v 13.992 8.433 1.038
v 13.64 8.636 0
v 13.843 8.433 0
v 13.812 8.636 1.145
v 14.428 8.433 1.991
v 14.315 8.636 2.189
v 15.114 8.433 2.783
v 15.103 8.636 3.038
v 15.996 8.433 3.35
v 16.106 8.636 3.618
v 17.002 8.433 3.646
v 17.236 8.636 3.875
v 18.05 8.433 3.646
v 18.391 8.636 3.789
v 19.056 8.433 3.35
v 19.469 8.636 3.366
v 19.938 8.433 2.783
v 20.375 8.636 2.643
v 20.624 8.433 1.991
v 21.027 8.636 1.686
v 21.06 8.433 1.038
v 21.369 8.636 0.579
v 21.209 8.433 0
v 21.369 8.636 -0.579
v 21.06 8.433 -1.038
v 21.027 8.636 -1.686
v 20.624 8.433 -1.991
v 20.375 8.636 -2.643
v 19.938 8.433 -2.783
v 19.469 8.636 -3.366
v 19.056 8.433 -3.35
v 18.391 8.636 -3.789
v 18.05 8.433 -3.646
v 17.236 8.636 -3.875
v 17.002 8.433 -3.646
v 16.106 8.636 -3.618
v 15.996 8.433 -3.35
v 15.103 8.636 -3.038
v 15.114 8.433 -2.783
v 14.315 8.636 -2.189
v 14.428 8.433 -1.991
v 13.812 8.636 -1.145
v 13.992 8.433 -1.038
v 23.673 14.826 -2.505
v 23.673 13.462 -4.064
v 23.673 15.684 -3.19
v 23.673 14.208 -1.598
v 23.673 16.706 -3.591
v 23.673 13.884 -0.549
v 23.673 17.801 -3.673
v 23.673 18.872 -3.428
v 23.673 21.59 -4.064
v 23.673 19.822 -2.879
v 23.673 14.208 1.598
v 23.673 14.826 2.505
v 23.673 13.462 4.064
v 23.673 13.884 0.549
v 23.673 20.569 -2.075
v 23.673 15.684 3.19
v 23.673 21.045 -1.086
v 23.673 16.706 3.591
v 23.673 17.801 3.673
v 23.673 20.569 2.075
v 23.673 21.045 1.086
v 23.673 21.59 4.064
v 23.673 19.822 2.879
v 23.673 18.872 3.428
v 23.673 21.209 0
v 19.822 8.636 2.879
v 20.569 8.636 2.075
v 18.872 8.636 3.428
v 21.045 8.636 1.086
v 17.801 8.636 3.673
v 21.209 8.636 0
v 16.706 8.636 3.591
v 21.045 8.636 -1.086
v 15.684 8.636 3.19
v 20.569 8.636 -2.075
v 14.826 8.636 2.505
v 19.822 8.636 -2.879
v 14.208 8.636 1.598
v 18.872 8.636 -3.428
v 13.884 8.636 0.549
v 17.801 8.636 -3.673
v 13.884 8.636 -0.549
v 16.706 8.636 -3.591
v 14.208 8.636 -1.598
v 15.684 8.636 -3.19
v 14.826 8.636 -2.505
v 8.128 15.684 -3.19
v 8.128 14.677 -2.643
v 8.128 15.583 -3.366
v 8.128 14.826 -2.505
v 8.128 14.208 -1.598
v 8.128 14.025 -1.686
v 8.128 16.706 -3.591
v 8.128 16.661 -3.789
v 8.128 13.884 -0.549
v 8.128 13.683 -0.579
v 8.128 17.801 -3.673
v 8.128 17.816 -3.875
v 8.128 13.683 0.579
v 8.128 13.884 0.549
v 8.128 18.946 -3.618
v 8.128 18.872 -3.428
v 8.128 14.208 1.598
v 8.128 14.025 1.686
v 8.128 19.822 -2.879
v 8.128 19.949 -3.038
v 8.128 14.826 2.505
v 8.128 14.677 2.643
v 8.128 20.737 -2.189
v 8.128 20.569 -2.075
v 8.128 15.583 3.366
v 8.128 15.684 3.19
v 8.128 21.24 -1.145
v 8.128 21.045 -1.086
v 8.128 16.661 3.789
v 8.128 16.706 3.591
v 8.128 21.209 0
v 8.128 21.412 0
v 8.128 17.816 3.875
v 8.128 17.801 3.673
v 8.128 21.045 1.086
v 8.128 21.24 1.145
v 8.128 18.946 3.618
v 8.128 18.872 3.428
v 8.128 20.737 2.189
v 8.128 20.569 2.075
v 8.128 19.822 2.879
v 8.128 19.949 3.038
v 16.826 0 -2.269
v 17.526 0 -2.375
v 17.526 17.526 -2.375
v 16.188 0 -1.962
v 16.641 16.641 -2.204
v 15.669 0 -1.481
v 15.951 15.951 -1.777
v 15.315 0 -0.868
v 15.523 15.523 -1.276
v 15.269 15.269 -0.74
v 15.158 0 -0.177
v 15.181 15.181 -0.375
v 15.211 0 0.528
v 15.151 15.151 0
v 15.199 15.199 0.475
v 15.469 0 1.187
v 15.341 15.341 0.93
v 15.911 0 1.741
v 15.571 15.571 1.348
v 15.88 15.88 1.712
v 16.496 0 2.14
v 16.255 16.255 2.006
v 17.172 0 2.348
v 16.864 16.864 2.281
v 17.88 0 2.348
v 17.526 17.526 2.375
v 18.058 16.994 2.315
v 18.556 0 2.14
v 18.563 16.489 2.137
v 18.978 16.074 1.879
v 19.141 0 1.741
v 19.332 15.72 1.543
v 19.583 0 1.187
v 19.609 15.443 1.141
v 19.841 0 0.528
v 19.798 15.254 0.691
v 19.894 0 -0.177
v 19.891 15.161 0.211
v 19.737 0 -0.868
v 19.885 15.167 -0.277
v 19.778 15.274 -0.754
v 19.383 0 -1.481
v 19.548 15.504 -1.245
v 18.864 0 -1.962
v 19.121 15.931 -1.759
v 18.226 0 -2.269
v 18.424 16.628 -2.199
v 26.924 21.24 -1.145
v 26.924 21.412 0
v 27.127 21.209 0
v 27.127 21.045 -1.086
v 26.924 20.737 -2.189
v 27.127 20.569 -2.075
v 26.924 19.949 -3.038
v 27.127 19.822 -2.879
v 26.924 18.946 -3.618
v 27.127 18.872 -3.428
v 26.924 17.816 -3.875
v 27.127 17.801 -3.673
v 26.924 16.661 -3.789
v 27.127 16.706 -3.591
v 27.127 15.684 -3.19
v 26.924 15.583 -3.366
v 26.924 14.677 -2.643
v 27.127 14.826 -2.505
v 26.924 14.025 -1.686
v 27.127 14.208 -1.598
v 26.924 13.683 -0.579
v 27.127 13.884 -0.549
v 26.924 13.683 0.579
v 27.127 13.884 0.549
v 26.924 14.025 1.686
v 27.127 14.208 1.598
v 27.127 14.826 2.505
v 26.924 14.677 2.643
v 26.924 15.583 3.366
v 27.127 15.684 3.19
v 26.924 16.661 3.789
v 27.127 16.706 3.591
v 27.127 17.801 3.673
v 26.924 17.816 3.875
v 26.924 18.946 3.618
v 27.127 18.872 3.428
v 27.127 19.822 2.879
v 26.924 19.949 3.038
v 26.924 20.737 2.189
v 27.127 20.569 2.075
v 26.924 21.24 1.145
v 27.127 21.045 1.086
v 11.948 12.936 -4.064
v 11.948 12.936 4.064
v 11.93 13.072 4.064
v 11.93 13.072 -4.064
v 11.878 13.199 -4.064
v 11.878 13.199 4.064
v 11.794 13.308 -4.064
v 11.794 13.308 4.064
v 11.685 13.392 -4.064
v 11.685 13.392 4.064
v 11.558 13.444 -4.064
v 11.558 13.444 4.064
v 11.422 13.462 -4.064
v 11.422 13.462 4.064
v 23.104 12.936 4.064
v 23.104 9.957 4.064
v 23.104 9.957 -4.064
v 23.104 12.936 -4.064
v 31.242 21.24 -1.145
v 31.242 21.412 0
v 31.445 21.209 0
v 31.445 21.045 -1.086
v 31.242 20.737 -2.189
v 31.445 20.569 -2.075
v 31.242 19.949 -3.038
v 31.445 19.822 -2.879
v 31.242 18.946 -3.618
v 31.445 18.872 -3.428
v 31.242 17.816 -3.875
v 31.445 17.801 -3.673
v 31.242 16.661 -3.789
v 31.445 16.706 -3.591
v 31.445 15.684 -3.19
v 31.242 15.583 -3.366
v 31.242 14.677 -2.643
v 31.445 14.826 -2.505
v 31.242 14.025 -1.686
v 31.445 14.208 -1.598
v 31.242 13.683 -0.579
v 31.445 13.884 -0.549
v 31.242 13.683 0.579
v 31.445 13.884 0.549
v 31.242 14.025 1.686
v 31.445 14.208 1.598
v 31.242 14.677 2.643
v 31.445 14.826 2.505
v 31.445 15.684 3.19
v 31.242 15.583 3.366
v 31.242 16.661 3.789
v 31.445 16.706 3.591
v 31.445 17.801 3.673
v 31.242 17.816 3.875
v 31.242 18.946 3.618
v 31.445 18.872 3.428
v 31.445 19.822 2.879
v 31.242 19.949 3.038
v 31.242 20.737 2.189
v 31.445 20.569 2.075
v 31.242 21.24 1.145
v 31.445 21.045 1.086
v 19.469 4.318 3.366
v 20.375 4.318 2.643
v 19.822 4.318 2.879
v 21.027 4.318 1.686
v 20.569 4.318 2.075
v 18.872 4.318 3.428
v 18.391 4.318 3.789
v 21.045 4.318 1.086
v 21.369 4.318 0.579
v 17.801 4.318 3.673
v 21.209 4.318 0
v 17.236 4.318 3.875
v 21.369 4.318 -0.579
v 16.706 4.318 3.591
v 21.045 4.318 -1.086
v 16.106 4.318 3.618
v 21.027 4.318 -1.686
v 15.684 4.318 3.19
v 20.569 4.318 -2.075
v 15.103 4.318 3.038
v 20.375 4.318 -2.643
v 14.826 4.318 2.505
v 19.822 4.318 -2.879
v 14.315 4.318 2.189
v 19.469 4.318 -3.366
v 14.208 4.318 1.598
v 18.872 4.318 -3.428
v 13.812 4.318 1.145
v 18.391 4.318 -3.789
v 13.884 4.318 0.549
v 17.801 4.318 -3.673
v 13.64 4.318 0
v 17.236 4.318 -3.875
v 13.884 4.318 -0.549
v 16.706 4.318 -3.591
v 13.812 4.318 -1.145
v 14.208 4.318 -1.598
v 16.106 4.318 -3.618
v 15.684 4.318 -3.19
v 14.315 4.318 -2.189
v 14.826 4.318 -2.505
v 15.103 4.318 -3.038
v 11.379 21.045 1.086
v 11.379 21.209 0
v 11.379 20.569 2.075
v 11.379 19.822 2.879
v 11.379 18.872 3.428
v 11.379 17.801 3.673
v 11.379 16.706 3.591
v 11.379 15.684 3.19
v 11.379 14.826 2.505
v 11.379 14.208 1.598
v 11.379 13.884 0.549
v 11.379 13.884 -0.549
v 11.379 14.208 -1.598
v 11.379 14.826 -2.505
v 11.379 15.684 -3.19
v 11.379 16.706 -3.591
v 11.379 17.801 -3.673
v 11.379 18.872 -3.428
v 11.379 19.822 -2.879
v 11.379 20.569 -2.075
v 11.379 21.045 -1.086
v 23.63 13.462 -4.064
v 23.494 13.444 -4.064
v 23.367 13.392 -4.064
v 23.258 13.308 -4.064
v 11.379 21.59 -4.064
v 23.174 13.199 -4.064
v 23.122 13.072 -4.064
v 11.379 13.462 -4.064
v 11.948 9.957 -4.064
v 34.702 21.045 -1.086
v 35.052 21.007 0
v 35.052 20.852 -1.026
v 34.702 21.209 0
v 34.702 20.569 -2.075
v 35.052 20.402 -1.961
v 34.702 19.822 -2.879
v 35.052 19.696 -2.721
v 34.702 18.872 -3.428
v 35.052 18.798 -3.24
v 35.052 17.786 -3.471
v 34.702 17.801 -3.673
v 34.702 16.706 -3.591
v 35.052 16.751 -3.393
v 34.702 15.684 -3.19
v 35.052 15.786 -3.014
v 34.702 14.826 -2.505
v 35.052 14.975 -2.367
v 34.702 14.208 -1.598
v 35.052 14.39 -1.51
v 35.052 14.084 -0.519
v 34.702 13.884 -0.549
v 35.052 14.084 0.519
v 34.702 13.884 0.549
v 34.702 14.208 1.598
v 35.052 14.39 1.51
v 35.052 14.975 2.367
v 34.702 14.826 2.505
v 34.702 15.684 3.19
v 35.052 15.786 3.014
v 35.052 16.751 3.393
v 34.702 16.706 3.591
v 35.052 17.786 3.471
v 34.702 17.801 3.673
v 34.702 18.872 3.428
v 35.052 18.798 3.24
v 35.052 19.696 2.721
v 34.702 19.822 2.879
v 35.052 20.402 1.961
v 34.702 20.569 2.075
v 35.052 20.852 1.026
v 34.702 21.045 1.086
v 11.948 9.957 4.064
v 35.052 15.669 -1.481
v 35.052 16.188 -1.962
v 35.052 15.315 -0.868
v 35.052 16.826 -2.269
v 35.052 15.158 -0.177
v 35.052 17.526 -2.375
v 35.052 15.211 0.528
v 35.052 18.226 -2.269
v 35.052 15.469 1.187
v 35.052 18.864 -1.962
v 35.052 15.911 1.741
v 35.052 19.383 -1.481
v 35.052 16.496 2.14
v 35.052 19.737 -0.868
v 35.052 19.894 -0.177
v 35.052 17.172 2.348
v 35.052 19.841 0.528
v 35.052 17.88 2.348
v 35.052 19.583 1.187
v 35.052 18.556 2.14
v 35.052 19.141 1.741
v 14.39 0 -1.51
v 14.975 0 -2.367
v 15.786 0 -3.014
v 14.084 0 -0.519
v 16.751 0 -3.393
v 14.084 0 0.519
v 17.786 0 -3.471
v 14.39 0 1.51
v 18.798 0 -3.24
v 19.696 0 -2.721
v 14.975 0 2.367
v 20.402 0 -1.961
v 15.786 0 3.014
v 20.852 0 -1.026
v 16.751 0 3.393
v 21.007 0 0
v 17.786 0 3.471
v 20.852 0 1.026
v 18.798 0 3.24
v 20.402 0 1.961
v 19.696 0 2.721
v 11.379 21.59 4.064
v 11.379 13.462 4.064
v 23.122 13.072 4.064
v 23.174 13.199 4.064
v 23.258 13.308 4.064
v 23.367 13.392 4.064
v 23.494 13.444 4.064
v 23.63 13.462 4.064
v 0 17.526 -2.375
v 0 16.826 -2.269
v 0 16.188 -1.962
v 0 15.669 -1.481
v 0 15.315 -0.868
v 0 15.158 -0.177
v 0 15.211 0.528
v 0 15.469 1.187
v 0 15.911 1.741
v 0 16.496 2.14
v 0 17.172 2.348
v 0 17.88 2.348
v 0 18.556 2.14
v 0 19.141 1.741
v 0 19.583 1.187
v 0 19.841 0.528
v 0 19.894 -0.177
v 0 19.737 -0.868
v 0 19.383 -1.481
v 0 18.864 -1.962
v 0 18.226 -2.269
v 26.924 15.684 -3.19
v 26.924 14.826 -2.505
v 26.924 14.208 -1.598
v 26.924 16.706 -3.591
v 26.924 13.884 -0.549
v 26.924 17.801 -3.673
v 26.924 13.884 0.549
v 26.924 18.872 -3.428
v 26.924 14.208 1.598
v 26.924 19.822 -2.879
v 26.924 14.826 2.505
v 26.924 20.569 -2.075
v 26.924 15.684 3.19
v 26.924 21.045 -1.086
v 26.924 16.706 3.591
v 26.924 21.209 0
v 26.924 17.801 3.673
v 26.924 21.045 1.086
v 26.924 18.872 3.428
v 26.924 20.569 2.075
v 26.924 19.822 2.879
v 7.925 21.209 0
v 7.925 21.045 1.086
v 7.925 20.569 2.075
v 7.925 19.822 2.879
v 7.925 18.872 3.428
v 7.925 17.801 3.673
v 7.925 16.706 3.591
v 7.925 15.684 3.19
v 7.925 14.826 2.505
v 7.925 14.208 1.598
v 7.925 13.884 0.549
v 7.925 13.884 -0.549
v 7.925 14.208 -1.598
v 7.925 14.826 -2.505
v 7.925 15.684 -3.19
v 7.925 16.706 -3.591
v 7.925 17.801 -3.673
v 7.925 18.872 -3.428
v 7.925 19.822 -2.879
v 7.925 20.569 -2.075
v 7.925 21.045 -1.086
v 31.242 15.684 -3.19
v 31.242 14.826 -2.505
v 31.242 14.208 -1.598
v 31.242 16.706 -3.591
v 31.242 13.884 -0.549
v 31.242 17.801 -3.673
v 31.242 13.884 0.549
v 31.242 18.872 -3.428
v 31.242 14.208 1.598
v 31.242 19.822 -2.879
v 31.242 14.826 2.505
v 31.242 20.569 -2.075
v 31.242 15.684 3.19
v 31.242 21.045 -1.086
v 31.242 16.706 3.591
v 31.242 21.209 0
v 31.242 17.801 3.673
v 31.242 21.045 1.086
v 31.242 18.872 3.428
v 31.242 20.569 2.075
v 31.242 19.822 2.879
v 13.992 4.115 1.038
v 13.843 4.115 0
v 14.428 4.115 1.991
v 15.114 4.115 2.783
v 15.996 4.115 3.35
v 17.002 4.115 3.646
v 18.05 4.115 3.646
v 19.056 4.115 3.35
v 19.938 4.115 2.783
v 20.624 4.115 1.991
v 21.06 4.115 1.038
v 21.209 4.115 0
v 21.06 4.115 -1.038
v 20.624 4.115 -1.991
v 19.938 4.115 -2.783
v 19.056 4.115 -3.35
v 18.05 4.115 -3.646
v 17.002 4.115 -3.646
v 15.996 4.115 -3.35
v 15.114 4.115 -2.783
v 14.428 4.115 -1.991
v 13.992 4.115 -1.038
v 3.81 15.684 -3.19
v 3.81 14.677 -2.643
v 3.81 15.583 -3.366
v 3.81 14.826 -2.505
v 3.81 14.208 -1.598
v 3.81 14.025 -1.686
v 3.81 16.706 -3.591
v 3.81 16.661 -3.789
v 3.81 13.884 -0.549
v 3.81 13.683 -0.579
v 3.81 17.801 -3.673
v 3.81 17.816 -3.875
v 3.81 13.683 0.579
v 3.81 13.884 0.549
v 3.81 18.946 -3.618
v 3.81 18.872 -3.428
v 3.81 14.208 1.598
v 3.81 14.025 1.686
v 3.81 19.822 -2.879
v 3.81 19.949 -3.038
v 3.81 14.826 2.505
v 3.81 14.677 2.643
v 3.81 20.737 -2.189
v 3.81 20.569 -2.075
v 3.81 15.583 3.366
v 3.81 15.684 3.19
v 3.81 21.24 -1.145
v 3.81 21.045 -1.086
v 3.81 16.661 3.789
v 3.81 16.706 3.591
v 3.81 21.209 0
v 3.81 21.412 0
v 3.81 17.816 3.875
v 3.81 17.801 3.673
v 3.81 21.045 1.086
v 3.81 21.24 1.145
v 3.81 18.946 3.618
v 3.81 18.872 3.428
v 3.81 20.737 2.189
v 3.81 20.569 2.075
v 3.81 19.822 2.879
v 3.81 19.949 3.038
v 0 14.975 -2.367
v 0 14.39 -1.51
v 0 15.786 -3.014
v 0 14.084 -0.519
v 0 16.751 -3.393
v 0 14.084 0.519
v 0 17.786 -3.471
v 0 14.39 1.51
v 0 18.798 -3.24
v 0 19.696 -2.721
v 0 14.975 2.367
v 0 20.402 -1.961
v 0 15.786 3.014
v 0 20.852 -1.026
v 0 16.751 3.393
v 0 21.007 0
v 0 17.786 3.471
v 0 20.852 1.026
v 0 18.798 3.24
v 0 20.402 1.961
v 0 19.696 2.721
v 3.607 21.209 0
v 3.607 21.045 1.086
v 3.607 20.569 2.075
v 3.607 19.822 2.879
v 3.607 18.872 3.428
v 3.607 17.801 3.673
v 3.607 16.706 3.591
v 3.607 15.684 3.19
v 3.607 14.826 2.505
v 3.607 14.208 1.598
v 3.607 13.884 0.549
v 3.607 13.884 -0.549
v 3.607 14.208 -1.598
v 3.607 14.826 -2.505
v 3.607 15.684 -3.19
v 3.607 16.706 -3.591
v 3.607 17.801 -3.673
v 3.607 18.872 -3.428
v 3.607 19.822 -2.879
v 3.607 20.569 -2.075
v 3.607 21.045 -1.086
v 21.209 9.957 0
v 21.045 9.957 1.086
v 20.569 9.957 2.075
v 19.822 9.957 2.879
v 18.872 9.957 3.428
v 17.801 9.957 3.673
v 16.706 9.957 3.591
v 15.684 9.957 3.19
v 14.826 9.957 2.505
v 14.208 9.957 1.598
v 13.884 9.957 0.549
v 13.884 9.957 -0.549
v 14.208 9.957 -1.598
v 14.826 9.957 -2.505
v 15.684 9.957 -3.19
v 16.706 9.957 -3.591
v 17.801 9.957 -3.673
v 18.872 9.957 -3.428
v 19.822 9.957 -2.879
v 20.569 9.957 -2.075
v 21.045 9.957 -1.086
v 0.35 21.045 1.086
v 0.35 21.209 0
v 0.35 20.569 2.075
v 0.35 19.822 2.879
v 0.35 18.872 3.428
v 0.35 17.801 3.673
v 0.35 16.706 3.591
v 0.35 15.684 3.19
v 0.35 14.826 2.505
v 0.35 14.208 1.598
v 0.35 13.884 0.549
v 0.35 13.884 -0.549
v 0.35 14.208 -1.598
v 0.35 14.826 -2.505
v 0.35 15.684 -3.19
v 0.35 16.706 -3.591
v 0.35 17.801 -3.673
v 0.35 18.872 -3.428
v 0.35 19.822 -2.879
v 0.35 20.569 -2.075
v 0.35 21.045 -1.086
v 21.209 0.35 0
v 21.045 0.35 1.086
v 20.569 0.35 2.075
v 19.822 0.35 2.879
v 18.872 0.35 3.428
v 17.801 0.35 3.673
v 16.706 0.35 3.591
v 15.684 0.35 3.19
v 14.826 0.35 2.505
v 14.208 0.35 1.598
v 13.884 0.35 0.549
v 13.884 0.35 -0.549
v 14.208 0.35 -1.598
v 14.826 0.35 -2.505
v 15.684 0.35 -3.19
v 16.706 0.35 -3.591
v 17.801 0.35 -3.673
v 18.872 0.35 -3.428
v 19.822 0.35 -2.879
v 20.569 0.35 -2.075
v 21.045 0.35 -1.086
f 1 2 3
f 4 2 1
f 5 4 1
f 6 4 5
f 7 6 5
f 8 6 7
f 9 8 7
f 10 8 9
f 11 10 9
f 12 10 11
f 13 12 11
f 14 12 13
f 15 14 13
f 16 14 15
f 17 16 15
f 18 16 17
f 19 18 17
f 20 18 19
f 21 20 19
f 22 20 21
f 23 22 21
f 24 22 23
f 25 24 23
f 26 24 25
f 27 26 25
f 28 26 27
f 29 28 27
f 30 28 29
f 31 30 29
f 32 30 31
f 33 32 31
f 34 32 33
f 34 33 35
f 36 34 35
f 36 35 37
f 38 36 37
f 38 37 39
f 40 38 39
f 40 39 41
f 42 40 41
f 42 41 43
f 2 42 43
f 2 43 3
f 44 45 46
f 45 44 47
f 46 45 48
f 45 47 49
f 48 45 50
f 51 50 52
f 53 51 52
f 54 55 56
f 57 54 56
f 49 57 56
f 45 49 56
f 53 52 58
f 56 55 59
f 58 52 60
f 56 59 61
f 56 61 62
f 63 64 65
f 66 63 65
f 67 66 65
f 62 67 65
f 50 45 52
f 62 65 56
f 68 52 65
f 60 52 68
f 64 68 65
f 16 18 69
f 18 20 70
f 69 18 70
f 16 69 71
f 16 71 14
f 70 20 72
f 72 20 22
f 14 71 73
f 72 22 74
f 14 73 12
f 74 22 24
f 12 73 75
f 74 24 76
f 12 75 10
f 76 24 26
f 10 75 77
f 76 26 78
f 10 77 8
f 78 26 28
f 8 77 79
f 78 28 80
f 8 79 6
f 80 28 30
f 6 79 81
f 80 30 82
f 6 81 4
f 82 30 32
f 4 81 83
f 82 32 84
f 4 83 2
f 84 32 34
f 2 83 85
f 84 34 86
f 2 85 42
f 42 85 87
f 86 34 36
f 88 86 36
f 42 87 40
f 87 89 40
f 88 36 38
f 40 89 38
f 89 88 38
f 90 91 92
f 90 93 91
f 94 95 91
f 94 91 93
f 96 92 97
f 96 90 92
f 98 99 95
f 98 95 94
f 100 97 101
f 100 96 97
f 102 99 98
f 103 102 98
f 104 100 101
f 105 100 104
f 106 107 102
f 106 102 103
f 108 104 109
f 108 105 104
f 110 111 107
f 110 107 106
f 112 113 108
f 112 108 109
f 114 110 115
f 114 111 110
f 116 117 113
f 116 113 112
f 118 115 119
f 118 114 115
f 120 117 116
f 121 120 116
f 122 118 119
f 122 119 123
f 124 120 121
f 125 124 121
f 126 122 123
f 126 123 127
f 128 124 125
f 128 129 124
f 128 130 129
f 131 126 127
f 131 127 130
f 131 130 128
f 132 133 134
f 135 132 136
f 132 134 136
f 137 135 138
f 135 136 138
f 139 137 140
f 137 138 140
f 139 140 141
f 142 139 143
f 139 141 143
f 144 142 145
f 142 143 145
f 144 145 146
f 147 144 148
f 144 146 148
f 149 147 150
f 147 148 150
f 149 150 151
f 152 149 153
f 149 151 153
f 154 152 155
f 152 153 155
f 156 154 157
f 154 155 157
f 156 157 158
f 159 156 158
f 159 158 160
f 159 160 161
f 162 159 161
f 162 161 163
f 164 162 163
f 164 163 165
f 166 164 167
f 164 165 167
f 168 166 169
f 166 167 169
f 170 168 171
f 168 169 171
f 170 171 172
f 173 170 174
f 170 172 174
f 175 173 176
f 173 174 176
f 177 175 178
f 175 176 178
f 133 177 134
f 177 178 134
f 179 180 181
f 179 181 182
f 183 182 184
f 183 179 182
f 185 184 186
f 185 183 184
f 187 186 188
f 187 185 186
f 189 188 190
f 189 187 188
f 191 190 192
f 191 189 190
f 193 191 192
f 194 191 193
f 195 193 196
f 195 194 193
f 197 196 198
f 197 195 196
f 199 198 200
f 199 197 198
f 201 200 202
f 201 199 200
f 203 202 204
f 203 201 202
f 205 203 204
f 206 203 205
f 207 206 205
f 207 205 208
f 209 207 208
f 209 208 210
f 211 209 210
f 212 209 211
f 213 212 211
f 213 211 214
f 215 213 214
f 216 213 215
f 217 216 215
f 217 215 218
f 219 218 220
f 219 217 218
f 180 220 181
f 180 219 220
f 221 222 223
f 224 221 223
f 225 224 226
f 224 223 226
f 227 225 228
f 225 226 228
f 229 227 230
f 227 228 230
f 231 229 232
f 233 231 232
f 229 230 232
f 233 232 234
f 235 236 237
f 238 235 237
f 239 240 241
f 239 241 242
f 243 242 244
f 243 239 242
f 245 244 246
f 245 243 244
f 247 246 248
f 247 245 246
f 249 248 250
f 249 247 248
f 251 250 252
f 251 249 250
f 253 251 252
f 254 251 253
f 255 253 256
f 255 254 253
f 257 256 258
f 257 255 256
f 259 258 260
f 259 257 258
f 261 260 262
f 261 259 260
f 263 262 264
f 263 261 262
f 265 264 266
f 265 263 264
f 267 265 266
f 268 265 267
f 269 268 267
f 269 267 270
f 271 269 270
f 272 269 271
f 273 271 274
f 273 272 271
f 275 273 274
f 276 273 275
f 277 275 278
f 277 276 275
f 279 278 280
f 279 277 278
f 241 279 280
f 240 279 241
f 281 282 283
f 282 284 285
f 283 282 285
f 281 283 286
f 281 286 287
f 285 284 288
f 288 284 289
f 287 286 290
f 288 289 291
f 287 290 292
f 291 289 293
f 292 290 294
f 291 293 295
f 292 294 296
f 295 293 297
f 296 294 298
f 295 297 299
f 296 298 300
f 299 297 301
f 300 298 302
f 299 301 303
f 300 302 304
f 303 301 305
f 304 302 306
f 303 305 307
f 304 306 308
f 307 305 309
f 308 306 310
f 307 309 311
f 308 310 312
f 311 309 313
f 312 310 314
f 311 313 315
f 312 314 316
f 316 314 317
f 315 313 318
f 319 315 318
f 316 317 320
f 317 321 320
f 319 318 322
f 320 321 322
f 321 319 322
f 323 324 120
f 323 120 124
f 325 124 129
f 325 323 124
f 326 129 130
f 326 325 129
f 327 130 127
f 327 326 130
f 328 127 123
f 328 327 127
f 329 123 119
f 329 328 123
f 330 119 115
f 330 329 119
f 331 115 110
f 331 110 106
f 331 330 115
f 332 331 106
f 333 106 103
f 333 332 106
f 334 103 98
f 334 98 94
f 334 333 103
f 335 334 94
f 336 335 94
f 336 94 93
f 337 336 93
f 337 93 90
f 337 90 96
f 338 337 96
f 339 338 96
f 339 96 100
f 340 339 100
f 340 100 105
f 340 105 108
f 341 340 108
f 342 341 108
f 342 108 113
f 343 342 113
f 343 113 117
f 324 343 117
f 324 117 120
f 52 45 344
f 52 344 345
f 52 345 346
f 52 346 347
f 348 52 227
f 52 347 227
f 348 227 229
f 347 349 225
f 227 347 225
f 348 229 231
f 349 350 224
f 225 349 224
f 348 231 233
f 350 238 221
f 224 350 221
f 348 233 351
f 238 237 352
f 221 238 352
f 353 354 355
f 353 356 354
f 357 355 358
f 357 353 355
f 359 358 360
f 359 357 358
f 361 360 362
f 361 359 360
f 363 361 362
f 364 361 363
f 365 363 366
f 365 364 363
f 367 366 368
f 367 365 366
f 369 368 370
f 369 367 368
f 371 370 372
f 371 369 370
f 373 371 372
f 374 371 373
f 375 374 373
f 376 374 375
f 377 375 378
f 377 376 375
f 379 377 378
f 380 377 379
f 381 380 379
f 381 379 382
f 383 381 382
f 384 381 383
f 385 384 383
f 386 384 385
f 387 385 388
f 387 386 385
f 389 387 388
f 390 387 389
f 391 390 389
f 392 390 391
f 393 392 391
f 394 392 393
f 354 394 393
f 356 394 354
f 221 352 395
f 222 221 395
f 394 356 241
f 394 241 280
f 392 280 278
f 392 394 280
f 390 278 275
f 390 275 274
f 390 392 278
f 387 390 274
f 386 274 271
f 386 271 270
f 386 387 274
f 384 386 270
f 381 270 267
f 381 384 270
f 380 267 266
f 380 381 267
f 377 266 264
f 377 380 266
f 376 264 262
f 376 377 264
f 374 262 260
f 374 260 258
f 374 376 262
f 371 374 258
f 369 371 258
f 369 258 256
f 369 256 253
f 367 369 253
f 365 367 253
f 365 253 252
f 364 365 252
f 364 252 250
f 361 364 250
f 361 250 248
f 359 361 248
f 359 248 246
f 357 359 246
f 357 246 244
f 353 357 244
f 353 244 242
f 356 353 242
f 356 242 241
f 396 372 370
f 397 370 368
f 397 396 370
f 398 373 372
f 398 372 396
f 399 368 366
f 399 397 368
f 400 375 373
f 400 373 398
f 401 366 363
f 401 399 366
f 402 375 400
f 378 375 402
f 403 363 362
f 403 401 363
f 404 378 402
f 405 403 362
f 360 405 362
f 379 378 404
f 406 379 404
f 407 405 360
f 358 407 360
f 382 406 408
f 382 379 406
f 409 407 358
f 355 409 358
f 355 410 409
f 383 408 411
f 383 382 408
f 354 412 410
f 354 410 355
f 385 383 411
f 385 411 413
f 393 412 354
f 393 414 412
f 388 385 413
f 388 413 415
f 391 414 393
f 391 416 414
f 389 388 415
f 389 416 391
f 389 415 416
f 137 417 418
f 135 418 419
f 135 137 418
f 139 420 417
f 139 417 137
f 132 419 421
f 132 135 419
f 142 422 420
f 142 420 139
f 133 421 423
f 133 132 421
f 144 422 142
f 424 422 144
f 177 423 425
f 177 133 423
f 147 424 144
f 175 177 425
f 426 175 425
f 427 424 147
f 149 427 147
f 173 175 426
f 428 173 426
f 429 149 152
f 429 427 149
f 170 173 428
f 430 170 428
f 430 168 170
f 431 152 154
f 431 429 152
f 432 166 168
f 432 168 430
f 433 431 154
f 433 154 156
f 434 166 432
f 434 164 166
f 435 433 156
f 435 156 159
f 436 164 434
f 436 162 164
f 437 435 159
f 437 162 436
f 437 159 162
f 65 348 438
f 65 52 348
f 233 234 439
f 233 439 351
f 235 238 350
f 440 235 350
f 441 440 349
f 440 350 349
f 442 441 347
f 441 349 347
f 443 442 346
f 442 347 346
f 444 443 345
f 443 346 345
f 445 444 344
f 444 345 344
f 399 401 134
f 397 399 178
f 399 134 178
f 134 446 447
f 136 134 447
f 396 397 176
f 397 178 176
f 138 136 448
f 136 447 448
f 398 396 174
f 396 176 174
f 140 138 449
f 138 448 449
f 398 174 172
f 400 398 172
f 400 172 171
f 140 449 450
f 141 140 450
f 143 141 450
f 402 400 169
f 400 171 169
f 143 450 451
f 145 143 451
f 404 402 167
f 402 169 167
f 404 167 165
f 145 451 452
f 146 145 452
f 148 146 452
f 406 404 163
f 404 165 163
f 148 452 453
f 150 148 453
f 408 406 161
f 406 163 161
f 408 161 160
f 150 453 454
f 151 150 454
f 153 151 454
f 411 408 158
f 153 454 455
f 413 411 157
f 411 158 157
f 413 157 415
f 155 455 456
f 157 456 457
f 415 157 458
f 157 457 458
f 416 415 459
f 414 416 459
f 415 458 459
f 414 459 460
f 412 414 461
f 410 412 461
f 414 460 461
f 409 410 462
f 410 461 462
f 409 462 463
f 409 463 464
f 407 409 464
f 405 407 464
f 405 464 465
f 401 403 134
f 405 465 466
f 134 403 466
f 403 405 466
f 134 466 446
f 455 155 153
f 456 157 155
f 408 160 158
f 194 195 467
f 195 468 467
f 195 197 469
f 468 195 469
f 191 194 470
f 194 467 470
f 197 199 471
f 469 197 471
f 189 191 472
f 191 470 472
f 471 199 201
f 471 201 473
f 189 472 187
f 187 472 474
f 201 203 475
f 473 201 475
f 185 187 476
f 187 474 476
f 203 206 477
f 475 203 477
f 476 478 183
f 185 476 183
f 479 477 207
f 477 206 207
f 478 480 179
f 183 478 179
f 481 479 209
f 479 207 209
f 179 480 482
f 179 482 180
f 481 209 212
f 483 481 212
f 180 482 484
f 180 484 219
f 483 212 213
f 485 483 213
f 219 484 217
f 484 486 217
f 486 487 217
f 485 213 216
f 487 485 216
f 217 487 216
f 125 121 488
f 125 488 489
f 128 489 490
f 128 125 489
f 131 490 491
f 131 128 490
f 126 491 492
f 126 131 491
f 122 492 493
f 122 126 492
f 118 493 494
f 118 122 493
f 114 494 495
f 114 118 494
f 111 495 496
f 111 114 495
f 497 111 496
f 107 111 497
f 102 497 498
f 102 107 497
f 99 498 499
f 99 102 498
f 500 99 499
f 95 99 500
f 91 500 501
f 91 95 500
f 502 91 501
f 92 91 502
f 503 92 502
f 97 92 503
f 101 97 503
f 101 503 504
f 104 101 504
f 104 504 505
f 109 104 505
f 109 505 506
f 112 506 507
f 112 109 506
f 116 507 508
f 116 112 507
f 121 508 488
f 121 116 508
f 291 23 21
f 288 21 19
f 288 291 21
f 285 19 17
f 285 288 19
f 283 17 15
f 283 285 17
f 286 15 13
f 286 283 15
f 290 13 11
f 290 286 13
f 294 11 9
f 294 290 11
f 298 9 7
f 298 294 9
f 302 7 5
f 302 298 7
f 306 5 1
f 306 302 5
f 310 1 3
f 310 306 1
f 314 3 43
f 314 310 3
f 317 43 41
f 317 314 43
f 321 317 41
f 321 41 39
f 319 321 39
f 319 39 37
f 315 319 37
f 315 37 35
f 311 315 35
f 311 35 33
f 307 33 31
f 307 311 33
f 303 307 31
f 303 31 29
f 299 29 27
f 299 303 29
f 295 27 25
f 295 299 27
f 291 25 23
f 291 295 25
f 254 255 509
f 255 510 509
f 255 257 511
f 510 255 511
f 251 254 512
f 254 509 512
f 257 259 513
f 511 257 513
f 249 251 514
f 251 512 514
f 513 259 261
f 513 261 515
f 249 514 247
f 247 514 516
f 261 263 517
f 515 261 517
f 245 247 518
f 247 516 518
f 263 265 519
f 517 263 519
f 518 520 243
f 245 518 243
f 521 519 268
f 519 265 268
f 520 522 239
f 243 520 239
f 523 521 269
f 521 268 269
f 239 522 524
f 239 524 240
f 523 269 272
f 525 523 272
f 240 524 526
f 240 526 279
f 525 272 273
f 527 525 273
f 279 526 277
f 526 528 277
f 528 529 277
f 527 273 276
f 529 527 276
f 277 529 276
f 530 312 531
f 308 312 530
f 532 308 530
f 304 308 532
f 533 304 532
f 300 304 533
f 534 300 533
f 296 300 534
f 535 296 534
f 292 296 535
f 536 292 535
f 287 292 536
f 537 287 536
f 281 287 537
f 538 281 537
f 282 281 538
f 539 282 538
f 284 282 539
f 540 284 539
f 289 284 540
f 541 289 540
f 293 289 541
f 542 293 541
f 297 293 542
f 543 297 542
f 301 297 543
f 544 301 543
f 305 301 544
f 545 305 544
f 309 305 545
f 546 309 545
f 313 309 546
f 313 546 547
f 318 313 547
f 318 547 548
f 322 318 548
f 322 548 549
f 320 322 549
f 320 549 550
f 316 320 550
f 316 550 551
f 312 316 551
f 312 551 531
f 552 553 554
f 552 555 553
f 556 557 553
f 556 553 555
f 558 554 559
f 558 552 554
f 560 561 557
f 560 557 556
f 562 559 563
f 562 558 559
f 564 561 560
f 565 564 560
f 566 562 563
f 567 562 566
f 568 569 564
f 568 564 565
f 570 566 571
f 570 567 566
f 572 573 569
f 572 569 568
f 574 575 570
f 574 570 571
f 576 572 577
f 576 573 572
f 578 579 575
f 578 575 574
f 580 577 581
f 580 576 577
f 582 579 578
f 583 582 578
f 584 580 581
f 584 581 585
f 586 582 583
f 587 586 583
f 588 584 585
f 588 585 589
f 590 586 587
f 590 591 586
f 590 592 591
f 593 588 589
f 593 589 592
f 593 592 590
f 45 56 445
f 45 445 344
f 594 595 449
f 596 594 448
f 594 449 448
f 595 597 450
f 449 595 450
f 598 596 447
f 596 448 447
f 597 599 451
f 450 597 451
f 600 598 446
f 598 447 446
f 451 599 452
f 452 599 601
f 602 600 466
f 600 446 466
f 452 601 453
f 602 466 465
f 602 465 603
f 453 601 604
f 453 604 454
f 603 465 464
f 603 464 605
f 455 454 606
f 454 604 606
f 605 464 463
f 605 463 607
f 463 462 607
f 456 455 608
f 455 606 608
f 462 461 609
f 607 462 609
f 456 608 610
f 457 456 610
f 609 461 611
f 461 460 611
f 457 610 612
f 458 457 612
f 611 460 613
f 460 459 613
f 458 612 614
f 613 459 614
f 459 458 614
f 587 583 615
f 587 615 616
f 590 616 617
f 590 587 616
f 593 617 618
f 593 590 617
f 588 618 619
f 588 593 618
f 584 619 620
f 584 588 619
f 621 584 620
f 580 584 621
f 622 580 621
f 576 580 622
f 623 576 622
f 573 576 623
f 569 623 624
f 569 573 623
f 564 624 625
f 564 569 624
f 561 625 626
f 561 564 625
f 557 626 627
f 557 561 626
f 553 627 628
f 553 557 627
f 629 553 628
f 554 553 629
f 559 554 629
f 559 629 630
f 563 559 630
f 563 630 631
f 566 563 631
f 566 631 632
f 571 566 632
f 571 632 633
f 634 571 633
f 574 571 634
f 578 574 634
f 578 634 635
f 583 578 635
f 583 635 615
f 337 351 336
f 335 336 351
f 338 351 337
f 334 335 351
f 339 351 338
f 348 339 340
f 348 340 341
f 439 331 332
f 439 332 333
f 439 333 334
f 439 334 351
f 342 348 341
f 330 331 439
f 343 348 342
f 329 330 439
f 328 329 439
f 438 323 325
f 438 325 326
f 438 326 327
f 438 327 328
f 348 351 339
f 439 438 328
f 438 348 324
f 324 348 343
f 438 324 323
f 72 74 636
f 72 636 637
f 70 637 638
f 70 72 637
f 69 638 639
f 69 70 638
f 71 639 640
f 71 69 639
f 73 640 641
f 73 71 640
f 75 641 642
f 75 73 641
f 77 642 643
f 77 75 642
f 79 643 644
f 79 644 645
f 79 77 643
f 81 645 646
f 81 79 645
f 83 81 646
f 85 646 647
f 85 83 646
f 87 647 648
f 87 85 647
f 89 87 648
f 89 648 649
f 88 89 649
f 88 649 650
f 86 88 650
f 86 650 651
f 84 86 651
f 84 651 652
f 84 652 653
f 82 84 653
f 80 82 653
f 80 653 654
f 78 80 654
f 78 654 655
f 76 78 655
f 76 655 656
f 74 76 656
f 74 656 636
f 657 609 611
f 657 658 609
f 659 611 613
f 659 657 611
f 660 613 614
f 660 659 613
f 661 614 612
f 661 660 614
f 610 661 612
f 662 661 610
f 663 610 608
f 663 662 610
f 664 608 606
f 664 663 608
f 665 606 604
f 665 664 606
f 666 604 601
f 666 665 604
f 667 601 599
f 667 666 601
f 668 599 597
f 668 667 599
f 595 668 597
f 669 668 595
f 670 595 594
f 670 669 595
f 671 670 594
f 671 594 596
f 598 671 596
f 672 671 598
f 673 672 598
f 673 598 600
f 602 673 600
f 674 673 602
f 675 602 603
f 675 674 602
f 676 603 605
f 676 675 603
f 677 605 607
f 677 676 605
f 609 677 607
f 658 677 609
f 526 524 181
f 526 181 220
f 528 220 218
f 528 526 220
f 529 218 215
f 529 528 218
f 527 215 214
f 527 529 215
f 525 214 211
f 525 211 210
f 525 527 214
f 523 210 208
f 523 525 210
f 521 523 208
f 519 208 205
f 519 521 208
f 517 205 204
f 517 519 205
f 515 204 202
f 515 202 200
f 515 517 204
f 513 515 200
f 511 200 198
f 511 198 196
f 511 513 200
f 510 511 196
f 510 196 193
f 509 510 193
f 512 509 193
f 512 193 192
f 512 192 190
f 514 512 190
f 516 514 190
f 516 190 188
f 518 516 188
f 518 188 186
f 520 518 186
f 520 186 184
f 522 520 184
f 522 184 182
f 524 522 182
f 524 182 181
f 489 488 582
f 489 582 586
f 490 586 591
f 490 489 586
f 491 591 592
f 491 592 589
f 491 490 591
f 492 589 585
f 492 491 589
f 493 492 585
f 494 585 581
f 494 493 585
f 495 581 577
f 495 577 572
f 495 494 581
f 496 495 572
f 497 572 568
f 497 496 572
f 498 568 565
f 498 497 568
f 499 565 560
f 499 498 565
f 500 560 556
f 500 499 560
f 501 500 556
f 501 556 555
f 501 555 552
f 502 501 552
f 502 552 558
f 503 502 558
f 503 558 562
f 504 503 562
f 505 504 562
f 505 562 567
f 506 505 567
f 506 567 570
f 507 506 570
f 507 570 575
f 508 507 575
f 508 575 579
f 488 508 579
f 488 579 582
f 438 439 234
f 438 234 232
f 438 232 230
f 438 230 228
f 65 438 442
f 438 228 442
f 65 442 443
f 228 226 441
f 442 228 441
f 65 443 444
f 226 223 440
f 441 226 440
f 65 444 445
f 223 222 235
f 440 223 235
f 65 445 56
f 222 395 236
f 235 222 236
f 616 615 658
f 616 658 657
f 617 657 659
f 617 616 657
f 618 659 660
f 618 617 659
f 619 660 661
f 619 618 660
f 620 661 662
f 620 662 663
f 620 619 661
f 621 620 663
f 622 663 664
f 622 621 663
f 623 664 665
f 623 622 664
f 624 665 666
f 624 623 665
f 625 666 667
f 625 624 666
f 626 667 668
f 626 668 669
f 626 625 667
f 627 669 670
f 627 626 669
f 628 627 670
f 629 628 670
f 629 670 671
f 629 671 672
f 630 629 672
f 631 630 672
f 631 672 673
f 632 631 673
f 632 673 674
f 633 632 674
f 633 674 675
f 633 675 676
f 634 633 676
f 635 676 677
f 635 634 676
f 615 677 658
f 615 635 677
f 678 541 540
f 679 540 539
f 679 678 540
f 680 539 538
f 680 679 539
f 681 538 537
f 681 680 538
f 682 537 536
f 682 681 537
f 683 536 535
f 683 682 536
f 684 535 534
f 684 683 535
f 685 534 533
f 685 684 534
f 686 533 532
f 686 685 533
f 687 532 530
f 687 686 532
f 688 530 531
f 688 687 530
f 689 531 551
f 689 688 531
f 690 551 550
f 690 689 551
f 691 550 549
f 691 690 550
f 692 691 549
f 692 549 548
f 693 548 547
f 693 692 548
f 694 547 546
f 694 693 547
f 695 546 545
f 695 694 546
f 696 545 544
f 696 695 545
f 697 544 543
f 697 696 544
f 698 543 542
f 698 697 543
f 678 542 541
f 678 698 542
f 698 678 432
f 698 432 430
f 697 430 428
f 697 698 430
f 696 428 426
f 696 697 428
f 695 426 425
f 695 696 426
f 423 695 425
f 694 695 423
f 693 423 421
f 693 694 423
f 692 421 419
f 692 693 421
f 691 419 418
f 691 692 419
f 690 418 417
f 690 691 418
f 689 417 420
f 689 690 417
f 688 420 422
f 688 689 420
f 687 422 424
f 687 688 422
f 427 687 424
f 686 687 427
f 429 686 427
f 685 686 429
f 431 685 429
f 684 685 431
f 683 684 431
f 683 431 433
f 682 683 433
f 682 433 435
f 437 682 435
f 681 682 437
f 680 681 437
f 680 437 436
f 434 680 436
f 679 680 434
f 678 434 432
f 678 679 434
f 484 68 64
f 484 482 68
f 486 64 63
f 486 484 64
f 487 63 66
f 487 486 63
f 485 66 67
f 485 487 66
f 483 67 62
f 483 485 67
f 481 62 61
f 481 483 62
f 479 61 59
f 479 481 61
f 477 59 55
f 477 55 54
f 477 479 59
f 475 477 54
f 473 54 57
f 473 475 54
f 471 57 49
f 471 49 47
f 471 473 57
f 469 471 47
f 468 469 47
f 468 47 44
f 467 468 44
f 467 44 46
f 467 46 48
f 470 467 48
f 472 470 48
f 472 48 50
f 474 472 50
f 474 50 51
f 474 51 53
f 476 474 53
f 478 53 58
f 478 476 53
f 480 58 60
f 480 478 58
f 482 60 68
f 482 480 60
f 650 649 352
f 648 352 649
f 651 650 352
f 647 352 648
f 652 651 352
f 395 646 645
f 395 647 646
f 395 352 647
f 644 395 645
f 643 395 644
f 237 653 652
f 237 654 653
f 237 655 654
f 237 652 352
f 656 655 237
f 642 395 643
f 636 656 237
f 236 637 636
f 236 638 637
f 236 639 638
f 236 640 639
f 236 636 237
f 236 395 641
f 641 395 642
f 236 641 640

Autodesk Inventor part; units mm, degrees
ref_plane "YZ Plane" through (0, 0, 0) normal (1, 0, 0) x (0, 1, 0)
ref_plane "XZ Plane" through (0, 0, 0) normal (0, 1, 0) x (-1, 0, 0)
ref_plane "XY Plane" through (0, 0, 0) normal (0, 0, 1) x (1, 0, 0)
sketch "Sketch7" plane through (0, 0, 0) normal (0, 0, 1) x (1, 0, 0)
  line L0 (0, 21.209) -> (11.3919, 21.209)
  line L1 (11.3919, 21.209) -> (11.3919, 21.209)
  line L2 (11.3919, 21.209) -> (23.6601, 21.209)
  line L3 (23.6601, 21.209) -> (23.6601, 21.209)
  line L4 (23.6601, 21.209) -> (35.052, 21.209)
  line L5 (35.052, 21.209) -> (35.052, 17.526)
  line L6 (0, 17.526) -> (0, 21.209)
  line L7 (0, 17.526) -> (35.052, 17.526)
  line L8 (-6.2642, 17.526) -> (48.9647, 17.526)
  point P0 (0, 0)
  dimension "d57" = 17.526
  dimension "d58" = 7.366
  dimension "d59" = 35.052
  dimension "d60" = 12.2682
  dimension "d128" = 3.683
revolve "Revolution3" add sketch "Sketch7" angle 360 about axis through (-6.2642, 17.526, 0) along (1, 0, 0)
ref_plane "Work Plane3" through (17.526, 17.526, 0) normal (-1, 0, 0) x (0, 0, 1)
sketch "Sketch8" plane through (17.526, 17.526, 0) normal (-1, 0, 0) x (0, 0, 1)
  line L0 (-4.064, 4.064) -> (4.064, 4.064)
  line L1 (4.064, 4.064) -> (4.064, -4.064)
  line L2 (4.064, -4.064) -> (-4.064, -4.064)
  line L3 (-4.064, -4.064) -> (-4.064, 4.064)
  circle A0 centre (0, 0) radius 1.3335
  circle A1 centre (0, 0) radius 3.683 projected
  dimension "d119" = 8.128
  dimension "d121" = 8.128
  dimension "d129" = 4.064
  dimension "d130" = 4.064
extrude "Extrusion5" add sketch "Sketch8" against normal mid plane 12.2936 contours L0 L1 L2 L3 | A1
sketch "Sketch9" plane through (0, 0, 0) normal (0, 0, 1) x (1, 0, 0)
  line L0 (17.526, 15.4328) -> (17.526, -3.476)
  line L1 (11.3792, 13.462) -> (23.6728, 13.462) projected
  line L2 (17.526, 13.462) -> (21.2458, 13.462)
  line L3 (21.2458, 13.462) -> (21.2458, 9.9568)
  line L4 (21.2458, 9.9568) -> (21.209, 9.9568)
  line L5 (21.209, 9.9568) -> (21.209, 0)
  line L6 (21.209, 0) -> (17.526, 0)
  line L7 (17.526, 0) -> (17.526, 13.462)
  point P0 (0, 0)
  dimension "d65" = 17.526
  dimension "d66" = 7.366
  dimension "d67" = 7.4397
  dimension "d68" = 3.5052
revolve "Revolution4" add sketch "Sketch9" angle 360 about axis through (17.526, 15.4328, 0) along (0, -1, 0)
sketch "Sketch10" plane through (17.526, 9.9568, 0) normal (0, -1, 0) x (1, 0, 0)
  circle A0 centre (0, 0) radius 3.7198 projected
  line L0 (-5.5778, 4.064) -> (5.5778, 4.064)
  line L1 (5.5778, 4.064) -> (5.5778, -4.064)
  line L2 (5.5778, -4.064) -> (-5.5778, -4.064)
  line L3 (-5.5778, -4.064) -> (-5.5778, 4.064)
  line L4 (-6.1468, 4.064) -> (6.1468, 4.064) projected
  line L5 (-6.1468, -4.064) -> (6.1468, -4.064) projected
  line L6 (-17.526, -3.683) -> (-17.526, 3.683) projected
  line L7 (17.526, -3.683) -> (17.526, 3.683) projected
  dimension "d122" = 11.9482
  dimension "d123" = 11.9482
extrude "Extrusion6" add sketch "Sketch10" against normal up to surface (3.5052 mm away)
sketch "Sketch11" plane through (0, 0, 0) normal (0, 0, 1) x (1, 0, 0)
  line L0 (-6.2642, 17.526) -> (48.9647, 17.526) projected
  line L1 (0, 21.209) -> (11.3792, 21.209) projected
  line L2 (8.128, 21.209) -> (8.128, 21.4122)
  line L3 (8.128, 21.209) -> (7.9248, 21.209)
  line L4 (7.9248, 21.209) -> (8.128, 21.4122)
  line L5 (23.6728, 21.59) -> (23.6728, 13.462) projected
  line L6 (3.81, 21.209) -> (3.81, 21.4122)
  line L7 (3.81, 21.209) -> (3.6068, 21.209)
  line L8 (3.6068, 21.209) -> (3.81, 21.4122)
  line L9 (17.526, 15.4328) -> (17.526, -3.476) projected
  line L10 (26.924, 21.209) -> (26.924, 21.4122)
  line L11 (26.924, 21.209) -> (27.1272, 21.209)
  line L12 (27.1272, 21.209) -> (26.924, 21.4122)
  line L13 (31.242, 21.209) -> (31.242, 21.4122)
  line L14 (31.242, 21.209) -> (31.4452, 21.209)
  line L15 (31.4452, 21.209) -> (31.242, 21.4122)
  line L16 (0, 13.843) -> (0, 21.209) projected
  dimension "d75" = 45
  dimension "d114" = 0.2032
  dimension "d115" = 3.81
  dimension "d116" = 4.318
revolve "Revolution5" add sketch "Sketch11" angle 360 about axis through (-6.2642, 17.526, 0) along (1, 0, 0)
sketch "Sketch12" plane through (0, 0, 0) normal (0, 0, 1) x (1, 0, 0)
  line L0 (13.843, 8.4328) -> (13.843, 8.636)
  line L1 (13.843, 8.4328) -> (13.6398, 8.636)
  line L2 (13.6398, 8.636) -> (13.843, 8.636)
  line L3 (17.526, 15.4328) -> (17.526, -3.476) projected
  line L4 (13.843, 9.9568) -> (13.843, 0) projected
  line L5 (11.322, 7.2263) -> (14.078, 7.2263) projected
  line L6 (13.843, 4.1148) -> (13.843, 4.318)
  line L7 (13.843, 4.1148) -> (13.6398, 4.318)
  line L8 (13.6398, 4.318) -> (13.843, 4.318)
  line L9 (13.843, 0) -> (21.209, 0) projected
  dimension "d89" = 45
  dimension "d90" = 45
  dimension "d124" = 0.2032
  dimension "d125" = 4.318
  dimension "d126" = 4.318
revolve "Revolution6" add sketch "Sketch12" angle 360 about axis through (17.526, 15.4328, 0) along (0, -1, 0)
hole "Hole3" at (35.052, 17.526, 0) direction (-1, 0, 0) diameter 4.7498 end through all
hole "Hole4" at (17.526, 0, 0) direction (0, 1, 0) diameter 4.7498 depth 17.526 tip angle 118
chamfer "Chamfer3" distance 0.3505 angle 30 1 edges at (0, 13.843, 0) measured on face at (1.2023, 21.1613, -0.5908)
chamfer "Chamfer4" distance 0.3505 angle 30 1 edges at (35.052, 13.843, 0) measured on face at (32.6475, 21.1613, -0.5908)
chamfer "Chamfer5" distance 0.3505 angle 30 1 edges at (13.843, 0, 0) measured on face at (21.1971, 2.7432, 0.2964)
fillet "Fillet1" radius 0.5258 2 edges at (11.9482, 13.462, 0) (23.1038, 13.462, 0)
equation "\"d57\" = M"
equation "\"d58\" = D1"
equation "\"d59\" = L"
equation "\"d60\" = 0.35 * L"
equation "\"d128\" = 0.5 * D1"
equation "\"d119\" = W1"
equation "\"d121\" = W1"
equation "\"d129\" = 0.5 * W1"
equation "\"d130\" = 0.5 * W1"
equation "\"d63\" = L - 2 * L3"
equation "\"d65\" = M"
equation "\"d66\" = D1"
equation "\"d67\" = 1.01 * D1"
equation "\"d68\" = 0.285714 * d60"
equation "\"d122\" = 1.05 * L3"
equation "\"d123\" = 1.05 * L3"
equation "\"d70\" = d60"
equation "\"d114\" = D2"
equation "\"d115\" = L1"
equation "\"d116\" = L2"
equation "\"d124\" = D2"
equation "\"d125\" = L2"
equation "\"d126\" = L2"
equation "\"d95\" = D"
equation "\"d104\" = D"
equation "\"d109\" = M"
equation "\"d111\" = 0.01 * L"
equation "\"d112\" = 0.01 * L"
equation "\"d131\" = 0.01 * L"
equation "\"d132\" = 0.01 * L"
equation "\"d134\" = 0.01 * L"
equation "\"d135\" = 0.01 * L"
equation "\"d127\" = 0.015 * L"
equation "\"L\" = 35.052"
equation "\"M\" = 17.526"
equation "\"D\" = 4.7498"
equation "\"d61\" = 1.75 * D"
equation "\"d84\" = 25.4"
equation "\"d85\" = 1.5748"
equation "\"L1\" = 3.81"
equation "\"L2\" = 4.318"
equation "\"L3\" = 11.3792"
equation "\"D1\" = 7.366"
equation "\"D2\" = 0.2032"
equation "\"W1\" = 8.128"
equation "\"d117\" = -0.5 * L"
properties part number "Tubo en T de unión 224 de Parker 224-6" material "Latón, amarillo claro"
